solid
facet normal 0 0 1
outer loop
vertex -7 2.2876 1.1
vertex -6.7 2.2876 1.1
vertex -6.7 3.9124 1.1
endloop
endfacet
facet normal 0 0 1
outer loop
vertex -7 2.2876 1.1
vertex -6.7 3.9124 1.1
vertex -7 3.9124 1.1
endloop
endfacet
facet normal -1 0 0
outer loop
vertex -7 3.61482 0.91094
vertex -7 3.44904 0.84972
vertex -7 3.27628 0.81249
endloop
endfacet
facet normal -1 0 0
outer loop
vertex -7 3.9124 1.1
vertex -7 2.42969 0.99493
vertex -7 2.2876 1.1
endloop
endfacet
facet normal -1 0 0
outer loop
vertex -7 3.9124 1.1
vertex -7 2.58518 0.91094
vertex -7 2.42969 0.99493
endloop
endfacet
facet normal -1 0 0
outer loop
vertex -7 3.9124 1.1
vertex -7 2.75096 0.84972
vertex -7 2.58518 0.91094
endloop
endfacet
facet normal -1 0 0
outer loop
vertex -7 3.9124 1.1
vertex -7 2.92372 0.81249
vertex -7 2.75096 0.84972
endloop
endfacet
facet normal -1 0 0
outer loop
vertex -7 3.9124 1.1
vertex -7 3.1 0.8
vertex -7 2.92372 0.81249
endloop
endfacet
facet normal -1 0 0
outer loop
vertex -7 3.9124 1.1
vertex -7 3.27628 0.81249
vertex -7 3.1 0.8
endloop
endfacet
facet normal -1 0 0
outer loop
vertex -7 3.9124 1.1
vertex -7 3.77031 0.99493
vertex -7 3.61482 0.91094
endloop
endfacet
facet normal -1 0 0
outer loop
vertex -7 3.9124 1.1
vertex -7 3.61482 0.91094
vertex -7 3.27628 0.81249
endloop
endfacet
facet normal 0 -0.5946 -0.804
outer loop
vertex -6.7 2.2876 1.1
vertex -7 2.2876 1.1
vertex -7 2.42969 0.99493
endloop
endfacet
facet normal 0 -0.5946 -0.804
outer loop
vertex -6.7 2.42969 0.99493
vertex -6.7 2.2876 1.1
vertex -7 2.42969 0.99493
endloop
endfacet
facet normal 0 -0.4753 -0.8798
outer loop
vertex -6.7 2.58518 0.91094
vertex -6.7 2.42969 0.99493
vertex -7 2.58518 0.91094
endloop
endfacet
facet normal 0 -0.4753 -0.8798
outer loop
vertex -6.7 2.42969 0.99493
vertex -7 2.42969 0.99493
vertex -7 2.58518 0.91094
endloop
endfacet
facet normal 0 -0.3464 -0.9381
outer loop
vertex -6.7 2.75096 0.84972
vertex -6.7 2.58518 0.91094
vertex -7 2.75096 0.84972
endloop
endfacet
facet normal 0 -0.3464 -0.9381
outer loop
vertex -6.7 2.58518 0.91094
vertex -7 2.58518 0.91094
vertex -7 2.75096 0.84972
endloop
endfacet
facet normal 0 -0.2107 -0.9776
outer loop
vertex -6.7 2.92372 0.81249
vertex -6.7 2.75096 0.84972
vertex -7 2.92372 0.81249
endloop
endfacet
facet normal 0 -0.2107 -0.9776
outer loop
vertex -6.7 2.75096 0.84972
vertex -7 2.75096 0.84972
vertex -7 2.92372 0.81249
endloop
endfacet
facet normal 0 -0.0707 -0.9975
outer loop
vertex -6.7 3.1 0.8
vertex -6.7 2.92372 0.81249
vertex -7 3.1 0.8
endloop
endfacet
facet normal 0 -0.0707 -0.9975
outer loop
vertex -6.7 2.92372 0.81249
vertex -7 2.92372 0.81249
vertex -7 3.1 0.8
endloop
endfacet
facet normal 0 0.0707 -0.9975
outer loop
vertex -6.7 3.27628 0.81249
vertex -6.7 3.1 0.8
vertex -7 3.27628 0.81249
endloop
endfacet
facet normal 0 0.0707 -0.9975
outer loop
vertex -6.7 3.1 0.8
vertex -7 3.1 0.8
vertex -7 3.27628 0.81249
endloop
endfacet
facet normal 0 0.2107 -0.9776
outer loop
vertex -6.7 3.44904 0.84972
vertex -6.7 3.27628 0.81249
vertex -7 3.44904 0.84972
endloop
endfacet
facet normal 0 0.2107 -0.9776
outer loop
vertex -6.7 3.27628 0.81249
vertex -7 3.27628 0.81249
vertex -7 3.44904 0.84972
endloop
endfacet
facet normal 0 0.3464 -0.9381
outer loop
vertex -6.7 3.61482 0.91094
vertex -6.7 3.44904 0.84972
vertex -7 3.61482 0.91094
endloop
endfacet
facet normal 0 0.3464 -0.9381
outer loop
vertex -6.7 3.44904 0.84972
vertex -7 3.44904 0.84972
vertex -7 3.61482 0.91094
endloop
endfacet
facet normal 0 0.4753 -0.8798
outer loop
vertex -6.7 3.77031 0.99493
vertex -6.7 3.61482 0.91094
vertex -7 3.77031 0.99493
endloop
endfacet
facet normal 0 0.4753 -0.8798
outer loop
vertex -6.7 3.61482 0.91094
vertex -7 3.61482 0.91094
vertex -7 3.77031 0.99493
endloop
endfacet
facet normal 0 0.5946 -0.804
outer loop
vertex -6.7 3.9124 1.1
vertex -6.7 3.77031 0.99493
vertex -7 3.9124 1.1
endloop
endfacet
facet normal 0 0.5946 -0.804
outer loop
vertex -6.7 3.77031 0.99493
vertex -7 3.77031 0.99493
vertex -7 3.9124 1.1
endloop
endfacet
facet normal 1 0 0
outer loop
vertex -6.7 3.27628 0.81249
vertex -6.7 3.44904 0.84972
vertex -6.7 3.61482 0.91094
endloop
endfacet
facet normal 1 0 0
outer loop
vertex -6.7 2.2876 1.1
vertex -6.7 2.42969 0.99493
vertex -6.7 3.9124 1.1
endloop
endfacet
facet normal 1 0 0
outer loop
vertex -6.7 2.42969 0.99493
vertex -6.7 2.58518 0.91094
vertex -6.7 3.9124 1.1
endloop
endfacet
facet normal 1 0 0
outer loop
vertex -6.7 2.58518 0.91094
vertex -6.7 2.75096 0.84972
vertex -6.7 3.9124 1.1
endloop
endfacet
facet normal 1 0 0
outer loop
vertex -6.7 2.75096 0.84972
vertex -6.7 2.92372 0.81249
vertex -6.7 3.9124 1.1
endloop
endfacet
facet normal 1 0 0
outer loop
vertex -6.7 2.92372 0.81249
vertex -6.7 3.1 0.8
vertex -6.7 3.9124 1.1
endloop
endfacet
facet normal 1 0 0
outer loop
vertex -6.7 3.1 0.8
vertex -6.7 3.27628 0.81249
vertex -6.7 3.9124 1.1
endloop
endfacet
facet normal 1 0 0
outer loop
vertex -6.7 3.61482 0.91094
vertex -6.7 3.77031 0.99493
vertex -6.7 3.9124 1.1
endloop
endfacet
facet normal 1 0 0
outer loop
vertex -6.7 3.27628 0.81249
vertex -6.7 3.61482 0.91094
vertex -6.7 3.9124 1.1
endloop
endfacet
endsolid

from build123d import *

# Parameters (mm, degrees)
BOX004_W          = 0.3
BOX004_H          = 3
BOX004_DEPTH      = 2
CYLINDER001_W     = 1.25
CYLINDER001_H     = 0.3
CYLINDER001_ANGLE = 180


with BuildPart() as cube001:
    # Box004 → Box004 (new body)
    with BuildSketch(Plane(origin=(6.7, 1.5, 1.1), x_dir=(1, 0, 0), z_dir=(0, 0, 1))):
        with Locations((0.15, 1.5)):
            Rectangle(BOX004_W, BOX004_H)
    extrude(amount=BOX004_DEPTH)


with BuildPart() as cut002:
    # Cylinder001 → Cylinder001 (revolve)
    with BuildSketch(Plane(origin=(6.7, 3.1, 2.05), x_dir=(0, -1, 0), z_dir=(0, 0, 1))):
        with Locations((0.625, 0.15)):
            Rectangle(CYLINDER001_W, CYLINDER001_H)
    revolve(axis=Axis((6.7, 3.1, 2.05), (1, 0, 0)), revolution_arc=CYLINDER001_ANGLE)

    # Cut002: cut Cube001
    add(cube001.part, mode=Mode.SUBTRACT)


with BuildPart() as part_mirroring001:
    # Part__Mirroring001: instance of Cut002
    add(cut002.part.mirror(Plane(origin=(0, 0, 0), x_dir=(0, -1, 0), z_dir=(1, 0, 0))))


solid = part_mirroring001.part
